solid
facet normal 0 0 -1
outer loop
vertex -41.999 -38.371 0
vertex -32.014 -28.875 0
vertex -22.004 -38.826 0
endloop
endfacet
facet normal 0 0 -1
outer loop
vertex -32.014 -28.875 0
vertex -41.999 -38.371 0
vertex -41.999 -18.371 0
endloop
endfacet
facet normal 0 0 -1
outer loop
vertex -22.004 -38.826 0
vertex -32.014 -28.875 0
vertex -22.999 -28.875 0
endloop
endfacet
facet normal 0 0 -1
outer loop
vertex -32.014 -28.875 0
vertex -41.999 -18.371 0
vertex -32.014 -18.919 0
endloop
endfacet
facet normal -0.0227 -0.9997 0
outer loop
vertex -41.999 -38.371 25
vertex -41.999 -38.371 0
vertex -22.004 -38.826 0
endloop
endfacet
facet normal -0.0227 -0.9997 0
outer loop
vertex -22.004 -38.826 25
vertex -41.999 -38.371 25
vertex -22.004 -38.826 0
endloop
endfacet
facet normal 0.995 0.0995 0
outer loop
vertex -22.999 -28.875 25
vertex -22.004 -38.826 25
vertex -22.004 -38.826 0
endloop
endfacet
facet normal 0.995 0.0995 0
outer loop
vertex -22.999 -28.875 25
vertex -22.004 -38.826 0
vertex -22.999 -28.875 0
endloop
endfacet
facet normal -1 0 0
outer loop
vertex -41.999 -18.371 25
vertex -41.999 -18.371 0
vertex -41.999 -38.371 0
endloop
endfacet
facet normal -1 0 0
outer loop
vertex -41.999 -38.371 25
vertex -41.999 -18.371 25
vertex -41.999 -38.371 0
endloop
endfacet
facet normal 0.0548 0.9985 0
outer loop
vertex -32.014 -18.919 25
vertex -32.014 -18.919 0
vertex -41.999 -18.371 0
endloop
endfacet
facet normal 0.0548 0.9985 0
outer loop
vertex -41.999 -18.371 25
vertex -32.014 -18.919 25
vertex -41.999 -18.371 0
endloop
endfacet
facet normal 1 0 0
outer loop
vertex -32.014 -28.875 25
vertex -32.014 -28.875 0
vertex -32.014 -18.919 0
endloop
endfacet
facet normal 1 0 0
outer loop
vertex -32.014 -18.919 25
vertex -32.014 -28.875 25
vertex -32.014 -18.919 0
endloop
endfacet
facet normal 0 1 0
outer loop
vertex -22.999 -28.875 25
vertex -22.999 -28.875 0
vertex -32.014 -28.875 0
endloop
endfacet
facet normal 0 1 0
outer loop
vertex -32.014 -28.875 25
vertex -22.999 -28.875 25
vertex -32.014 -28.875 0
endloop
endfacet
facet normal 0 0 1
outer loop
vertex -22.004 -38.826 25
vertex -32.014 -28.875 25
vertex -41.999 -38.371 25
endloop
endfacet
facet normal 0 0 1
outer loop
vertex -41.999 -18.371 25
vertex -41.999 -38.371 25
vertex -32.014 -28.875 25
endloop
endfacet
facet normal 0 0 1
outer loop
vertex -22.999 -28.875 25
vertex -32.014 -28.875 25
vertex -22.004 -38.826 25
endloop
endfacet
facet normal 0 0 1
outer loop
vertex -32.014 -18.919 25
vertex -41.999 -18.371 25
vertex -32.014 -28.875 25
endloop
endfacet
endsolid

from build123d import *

# Parameters (mm, degrees)
F1_DEPTH = 25


with BuildPart() as f1:
    # F0 (on Top) → F1 (new body)
    with BuildSketch(Plane.XY):
        Polygon((-32.0135473862, -18.9185493521), (-41.9985689223, -18.371425122), (-41.9985689223, -38.371425122), (-22.0037322274, -38.8258539341), (-22.9987681159, -28.8754819018), (-32.0135473862, -28.8754819018), align=None)
    extrude(amount=F1_DEPTH)


with BuildPart() as f1b:
    # F0 (on Top) → F1, piece 2 (new body)
    with BuildSketch(Plane.XY):
        Polygon((23.4582594037, -14.5173627138), (13.4582594037, -14.5173627138), (13.4582594037, -34.5173627138), (33.4582594037, -34.5173627138), (33.4582594037, -24.5173627138), (23.4582594037, -24.5173627138), align=None)
    extrude(amount=F1_DEPTH)


solid = f1.part
